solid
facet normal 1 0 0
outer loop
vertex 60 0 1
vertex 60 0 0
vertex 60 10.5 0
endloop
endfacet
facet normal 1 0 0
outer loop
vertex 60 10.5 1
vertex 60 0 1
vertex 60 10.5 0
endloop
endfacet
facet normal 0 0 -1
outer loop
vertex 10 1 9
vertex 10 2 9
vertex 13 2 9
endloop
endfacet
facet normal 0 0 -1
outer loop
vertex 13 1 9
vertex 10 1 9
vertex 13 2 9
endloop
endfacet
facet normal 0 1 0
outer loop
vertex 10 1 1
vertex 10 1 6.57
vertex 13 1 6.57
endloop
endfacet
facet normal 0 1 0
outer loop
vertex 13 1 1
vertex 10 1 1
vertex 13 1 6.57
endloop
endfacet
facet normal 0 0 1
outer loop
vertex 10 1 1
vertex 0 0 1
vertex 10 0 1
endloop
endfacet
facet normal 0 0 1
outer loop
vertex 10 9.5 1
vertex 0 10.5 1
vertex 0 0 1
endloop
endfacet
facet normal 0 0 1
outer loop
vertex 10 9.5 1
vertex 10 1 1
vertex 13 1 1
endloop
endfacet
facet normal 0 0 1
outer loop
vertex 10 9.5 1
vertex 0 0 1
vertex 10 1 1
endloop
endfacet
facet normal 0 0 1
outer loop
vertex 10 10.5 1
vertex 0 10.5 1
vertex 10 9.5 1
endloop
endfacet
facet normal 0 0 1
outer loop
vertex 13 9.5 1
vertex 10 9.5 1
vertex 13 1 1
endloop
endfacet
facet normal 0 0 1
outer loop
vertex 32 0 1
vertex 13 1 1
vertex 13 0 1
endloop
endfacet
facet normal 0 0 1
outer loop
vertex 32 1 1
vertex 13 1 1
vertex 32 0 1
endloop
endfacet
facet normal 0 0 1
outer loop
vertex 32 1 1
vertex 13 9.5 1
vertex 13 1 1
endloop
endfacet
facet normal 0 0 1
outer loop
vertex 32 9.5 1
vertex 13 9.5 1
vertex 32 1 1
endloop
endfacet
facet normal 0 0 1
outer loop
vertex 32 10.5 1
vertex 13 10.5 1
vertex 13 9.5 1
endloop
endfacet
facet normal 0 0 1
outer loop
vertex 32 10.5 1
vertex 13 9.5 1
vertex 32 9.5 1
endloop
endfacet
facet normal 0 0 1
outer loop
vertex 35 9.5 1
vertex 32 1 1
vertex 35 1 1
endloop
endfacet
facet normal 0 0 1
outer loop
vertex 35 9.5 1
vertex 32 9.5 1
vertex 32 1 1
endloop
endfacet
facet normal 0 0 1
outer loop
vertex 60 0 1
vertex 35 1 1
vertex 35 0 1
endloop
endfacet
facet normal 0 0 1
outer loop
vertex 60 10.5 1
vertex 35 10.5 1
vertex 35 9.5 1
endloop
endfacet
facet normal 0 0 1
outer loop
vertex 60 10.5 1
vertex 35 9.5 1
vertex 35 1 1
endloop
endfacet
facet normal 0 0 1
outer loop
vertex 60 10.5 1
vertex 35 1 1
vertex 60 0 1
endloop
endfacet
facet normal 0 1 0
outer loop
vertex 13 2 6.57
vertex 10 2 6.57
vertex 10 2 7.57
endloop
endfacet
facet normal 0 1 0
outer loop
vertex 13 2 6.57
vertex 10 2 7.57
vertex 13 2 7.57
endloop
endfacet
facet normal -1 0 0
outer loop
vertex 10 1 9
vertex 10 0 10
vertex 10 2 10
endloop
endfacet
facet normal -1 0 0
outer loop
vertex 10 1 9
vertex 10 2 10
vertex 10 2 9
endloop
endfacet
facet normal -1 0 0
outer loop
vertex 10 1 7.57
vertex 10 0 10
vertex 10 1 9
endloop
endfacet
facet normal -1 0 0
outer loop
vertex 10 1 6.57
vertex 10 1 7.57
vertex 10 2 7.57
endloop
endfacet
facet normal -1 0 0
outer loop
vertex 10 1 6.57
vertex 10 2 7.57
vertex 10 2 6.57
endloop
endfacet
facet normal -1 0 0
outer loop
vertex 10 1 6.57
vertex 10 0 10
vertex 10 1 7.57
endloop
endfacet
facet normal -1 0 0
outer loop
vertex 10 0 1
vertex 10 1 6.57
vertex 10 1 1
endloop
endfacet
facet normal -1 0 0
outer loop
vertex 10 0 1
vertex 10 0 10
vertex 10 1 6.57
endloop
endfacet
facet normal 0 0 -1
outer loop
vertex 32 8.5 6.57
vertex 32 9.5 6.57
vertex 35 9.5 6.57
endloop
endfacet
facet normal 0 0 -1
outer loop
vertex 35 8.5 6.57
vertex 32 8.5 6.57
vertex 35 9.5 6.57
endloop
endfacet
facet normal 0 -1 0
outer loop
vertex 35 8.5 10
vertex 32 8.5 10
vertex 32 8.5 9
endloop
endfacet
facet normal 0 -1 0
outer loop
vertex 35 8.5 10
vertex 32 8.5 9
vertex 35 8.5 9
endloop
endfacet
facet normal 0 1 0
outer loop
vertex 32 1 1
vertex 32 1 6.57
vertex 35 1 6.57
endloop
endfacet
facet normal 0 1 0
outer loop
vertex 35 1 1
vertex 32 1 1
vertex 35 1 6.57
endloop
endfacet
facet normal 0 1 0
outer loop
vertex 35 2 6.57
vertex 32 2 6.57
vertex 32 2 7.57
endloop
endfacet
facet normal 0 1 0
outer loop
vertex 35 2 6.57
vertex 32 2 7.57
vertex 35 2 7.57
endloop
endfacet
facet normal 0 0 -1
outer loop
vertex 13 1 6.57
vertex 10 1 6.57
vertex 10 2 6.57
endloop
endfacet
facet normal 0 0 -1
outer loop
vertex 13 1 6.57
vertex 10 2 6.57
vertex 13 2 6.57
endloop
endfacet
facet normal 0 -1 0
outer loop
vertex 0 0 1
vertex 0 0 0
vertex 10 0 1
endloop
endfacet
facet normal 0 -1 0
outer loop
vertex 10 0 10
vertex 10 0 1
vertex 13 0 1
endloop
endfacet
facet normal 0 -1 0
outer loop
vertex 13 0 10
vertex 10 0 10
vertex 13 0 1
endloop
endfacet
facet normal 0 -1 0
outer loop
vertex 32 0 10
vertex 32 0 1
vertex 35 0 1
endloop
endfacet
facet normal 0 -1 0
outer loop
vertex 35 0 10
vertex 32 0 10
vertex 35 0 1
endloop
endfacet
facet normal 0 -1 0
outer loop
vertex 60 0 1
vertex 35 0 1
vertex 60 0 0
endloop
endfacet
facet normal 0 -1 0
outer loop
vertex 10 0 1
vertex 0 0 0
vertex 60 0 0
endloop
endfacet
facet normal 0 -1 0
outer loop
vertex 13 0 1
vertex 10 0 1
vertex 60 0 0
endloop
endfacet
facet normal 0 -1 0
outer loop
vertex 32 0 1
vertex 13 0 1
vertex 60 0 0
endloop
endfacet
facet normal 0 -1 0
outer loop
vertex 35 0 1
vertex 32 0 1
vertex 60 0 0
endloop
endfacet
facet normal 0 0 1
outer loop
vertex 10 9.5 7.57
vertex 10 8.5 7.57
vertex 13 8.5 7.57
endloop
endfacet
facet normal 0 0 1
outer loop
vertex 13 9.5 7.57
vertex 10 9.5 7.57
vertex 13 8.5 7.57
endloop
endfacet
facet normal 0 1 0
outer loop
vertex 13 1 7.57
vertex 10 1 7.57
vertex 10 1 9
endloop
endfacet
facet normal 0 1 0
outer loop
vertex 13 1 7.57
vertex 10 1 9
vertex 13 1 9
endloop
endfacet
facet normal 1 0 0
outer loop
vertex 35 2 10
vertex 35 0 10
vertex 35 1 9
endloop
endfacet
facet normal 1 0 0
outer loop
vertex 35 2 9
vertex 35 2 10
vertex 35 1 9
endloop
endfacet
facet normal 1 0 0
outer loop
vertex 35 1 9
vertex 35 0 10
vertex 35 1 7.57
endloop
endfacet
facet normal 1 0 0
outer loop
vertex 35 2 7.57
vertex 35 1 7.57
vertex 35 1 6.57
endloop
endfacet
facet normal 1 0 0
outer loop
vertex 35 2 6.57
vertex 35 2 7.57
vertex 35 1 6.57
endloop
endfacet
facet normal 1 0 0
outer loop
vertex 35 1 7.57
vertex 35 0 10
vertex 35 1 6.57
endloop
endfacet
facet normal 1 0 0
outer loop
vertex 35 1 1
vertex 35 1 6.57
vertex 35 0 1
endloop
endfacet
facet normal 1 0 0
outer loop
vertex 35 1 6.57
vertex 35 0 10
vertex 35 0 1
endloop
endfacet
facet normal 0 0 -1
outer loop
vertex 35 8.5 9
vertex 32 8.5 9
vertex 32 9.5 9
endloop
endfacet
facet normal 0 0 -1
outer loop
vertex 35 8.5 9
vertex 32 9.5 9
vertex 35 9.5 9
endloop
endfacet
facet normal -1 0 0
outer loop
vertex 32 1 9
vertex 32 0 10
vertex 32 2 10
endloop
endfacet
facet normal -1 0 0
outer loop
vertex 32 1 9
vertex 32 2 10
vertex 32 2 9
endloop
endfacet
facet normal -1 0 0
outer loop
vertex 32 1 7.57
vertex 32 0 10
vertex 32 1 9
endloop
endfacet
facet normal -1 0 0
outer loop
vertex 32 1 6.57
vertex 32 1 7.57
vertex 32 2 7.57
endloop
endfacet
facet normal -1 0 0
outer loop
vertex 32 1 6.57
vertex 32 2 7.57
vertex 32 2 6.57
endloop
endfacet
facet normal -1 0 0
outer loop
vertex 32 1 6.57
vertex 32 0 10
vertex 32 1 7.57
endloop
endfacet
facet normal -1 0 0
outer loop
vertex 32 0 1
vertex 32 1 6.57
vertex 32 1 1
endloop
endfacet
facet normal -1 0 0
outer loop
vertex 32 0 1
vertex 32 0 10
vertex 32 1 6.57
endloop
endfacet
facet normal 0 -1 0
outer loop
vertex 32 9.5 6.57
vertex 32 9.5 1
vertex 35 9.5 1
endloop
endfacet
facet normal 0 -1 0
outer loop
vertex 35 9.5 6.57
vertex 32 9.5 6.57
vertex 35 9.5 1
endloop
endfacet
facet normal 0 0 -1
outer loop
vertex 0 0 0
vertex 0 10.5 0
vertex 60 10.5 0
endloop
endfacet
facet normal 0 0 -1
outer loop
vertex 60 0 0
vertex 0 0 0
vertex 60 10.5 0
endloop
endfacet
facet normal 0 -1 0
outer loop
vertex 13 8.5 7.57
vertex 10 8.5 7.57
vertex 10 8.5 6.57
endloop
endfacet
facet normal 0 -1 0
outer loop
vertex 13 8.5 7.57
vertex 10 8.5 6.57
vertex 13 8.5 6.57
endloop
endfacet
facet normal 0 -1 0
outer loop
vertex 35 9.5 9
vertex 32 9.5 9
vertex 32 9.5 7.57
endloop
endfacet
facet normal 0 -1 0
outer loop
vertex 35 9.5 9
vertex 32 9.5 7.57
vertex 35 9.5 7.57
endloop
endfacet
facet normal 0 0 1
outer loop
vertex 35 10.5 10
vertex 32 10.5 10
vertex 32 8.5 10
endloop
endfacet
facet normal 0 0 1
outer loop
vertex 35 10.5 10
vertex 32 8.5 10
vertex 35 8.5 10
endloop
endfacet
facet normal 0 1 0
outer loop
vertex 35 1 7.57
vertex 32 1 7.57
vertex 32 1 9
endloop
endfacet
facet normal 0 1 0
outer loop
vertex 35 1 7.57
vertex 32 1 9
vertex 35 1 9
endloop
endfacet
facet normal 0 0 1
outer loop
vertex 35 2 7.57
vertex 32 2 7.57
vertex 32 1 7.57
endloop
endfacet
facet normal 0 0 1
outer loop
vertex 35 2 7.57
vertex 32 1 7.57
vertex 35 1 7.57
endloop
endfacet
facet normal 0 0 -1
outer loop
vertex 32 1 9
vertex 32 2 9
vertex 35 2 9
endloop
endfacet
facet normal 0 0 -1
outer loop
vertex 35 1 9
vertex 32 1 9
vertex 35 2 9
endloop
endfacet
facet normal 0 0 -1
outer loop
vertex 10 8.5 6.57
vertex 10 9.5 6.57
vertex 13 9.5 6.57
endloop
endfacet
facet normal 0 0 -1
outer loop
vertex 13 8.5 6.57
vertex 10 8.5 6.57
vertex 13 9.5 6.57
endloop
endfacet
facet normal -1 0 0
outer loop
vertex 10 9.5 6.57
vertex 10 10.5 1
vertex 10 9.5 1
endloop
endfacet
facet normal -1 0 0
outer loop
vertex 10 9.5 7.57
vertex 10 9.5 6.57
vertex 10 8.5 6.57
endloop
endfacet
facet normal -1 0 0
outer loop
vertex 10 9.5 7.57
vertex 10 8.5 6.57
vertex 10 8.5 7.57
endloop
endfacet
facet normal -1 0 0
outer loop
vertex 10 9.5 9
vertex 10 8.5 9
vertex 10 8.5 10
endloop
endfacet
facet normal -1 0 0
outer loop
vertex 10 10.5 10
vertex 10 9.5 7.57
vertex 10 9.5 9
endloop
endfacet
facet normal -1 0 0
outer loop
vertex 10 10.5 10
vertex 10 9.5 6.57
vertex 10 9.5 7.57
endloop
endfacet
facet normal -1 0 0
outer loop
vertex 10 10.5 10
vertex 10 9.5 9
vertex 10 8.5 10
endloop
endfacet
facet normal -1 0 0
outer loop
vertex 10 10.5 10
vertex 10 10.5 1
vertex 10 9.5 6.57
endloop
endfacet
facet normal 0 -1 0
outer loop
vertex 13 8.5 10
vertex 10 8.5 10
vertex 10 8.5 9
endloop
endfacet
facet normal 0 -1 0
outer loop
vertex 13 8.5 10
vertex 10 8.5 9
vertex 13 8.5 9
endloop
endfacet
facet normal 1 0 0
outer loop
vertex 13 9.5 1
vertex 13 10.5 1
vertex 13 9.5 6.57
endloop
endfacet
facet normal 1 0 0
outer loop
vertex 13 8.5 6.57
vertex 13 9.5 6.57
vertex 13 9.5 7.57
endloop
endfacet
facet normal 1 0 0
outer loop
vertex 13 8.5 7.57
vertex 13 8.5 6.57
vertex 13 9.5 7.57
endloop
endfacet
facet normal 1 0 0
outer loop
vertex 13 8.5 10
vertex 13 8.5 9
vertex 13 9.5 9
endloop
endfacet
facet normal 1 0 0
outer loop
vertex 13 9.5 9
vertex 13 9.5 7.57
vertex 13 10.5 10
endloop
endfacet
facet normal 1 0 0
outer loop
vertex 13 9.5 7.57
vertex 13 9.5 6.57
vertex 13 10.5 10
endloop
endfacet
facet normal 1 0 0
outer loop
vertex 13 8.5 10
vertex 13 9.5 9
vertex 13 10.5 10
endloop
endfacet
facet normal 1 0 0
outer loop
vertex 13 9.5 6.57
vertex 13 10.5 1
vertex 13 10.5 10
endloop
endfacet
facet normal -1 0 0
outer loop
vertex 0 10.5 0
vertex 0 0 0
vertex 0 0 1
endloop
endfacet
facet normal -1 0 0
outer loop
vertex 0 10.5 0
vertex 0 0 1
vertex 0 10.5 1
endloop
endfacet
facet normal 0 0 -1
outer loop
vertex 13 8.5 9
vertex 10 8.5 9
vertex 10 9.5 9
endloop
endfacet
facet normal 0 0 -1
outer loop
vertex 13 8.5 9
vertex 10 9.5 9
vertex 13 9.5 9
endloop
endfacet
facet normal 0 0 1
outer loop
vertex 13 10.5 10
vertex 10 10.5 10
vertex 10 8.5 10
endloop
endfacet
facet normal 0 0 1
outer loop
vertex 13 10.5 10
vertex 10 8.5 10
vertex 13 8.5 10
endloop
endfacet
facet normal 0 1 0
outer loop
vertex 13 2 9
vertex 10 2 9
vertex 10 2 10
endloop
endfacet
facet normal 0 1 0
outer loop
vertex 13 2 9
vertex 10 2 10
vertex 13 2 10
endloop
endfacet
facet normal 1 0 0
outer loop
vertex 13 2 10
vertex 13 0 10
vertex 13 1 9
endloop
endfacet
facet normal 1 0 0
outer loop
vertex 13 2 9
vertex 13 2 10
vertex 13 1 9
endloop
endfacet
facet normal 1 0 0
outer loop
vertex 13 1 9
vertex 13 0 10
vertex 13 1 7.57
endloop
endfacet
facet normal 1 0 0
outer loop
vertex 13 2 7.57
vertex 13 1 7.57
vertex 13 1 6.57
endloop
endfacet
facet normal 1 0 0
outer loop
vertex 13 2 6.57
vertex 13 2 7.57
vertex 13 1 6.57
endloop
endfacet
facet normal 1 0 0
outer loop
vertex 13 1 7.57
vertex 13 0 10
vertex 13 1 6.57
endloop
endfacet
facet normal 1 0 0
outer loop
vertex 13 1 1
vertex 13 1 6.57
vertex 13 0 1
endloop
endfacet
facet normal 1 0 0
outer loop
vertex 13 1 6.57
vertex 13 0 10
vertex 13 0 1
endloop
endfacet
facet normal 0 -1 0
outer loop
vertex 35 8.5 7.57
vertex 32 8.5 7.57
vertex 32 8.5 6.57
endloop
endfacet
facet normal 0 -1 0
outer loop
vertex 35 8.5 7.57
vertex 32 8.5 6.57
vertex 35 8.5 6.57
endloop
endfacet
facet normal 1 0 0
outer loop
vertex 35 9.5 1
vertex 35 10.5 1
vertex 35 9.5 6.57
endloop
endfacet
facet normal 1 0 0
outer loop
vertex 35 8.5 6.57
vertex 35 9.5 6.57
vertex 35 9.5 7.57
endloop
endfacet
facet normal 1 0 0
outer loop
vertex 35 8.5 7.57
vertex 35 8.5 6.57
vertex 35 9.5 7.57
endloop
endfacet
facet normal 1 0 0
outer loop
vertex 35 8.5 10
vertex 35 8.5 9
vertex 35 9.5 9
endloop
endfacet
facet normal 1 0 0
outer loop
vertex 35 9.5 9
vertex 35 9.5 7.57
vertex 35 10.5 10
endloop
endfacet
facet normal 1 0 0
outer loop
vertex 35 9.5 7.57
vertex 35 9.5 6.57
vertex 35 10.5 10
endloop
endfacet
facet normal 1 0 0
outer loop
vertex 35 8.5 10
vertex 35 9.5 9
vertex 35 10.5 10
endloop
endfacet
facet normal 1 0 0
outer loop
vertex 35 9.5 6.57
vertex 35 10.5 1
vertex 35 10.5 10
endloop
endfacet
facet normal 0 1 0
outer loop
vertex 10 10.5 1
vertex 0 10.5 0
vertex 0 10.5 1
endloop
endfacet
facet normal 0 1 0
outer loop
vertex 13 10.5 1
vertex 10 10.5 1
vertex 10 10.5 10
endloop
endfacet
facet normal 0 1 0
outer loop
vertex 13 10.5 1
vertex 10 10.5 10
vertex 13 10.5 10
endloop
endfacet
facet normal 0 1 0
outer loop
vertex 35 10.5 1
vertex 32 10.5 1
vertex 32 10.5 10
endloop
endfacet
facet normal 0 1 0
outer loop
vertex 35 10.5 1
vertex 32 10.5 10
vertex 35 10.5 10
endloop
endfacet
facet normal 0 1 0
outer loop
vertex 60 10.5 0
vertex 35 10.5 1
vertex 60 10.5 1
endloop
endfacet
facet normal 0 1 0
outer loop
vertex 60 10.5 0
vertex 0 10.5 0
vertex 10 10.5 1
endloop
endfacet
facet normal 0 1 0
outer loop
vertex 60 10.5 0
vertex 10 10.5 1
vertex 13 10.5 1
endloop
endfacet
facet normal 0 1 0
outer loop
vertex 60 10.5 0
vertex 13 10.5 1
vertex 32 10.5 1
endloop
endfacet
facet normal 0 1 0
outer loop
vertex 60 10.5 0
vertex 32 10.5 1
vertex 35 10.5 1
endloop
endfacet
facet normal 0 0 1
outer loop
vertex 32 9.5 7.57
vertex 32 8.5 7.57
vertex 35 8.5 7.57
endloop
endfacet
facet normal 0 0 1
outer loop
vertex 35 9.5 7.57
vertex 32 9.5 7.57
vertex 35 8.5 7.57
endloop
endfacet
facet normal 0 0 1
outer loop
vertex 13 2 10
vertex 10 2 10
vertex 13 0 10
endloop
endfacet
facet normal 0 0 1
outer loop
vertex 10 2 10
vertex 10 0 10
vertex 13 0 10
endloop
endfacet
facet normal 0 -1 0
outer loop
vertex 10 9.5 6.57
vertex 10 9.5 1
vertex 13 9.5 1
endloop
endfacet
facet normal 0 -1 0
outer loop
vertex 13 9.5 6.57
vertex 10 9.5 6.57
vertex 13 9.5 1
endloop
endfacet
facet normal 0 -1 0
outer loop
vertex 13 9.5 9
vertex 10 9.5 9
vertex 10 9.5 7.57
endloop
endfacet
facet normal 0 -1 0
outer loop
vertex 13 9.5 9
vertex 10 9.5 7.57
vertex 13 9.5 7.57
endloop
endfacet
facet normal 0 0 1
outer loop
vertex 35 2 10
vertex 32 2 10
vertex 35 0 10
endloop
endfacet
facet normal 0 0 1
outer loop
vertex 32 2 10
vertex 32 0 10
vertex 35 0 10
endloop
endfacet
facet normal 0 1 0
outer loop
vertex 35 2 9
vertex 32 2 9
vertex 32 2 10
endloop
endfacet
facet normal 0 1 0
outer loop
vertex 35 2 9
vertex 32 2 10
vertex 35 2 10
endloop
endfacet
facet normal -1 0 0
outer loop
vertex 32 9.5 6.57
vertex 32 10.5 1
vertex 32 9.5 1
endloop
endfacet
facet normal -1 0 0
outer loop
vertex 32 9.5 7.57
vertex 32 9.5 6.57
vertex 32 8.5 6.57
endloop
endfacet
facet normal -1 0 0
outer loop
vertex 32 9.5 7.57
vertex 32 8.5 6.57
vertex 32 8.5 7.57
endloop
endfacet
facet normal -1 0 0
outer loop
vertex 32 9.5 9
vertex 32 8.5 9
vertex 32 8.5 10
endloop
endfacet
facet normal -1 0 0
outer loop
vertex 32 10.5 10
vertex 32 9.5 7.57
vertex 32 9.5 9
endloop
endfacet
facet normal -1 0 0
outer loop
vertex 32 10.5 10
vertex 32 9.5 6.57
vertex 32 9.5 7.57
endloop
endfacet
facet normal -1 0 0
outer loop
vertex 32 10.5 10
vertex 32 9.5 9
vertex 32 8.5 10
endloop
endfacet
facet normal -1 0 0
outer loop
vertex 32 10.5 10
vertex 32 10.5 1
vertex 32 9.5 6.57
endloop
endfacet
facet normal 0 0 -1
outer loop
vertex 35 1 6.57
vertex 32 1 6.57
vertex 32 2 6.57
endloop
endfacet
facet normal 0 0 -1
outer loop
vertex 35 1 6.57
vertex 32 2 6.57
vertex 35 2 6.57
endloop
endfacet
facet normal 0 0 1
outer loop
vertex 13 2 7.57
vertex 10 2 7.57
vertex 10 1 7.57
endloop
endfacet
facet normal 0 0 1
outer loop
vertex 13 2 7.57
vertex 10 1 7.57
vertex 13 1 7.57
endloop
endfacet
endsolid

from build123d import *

# Parameters (mm, degrees)
SKETCH1_W           = 60
SKETCH1_H           = 10.5
BOSS_EXTRUDE1_DEPTH = 1
SKETCH2_W           = 3
SKETCH2_H           = 10
BOSS_EXTRUDE2_DEPTH = 1
SKETCH3_W           = 3
SKETCH3_H           = 3.43
BOSS_EXTRUDE3_DEPTH = 1
SKETCH4_W           = 3
SKETCH4_H           = 1.43
CUT_EXTRUDE1_DEPTH  = 1
SKETCH6_W           = 3
SKETCH6_H           = 10
BOSS_EXTRUDE4_DEPTH = 1
SKETCH7_W           = 3
SKETCH7_H           = 3.43
BOSS_EXTRUDE5_DEPTH = 1
SKETCH8_W           = 3
SKETCH8_H           = 1.43
CUT_EXTRUDE2_DEPTH  = 1
SKETCH9_W           = 3
SKETCH9_H           = 10
BOSS_EXTRUDE6_DEPTH = 1
SKETCH10_W          = 3
SKETCH10_H          = 3.43
BOSS_EXTRUDE7_DEPTH = 1
SKETCH11_W          = 3
SKETCH11_H          = 1.43
CUT_EXTRUDE3_DEPTH  = 1
SKETCH12_W          = 3
SKETCH12_H          = 10
BOSS_EXTRUDE8_DEPTH = 1
SKETCH13_W          = 3
SKETCH13_H          = 3.43
BOSS_EXTRUDE9_DEPTH = 1
SKETCH14_W          = 3
SKETCH14_H          = 1.43
CUT_EXTRUDE4_DEPTH  = 1


with BuildPart() as part:
    # Sketch1 → Boss-Extrude1 (new body)
    with BuildSketch(Plane.XY):
        with Locations((30, 5.25)):
            Rectangle(SKETCH1_W, SKETCH1_H)
    extrude(amount=BOSS_EXTRUDE1_DEPTH)

    # Sketch2 → Boss-Extrude2 (add)
    with BuildSketch(Plane.XZ):
        with Locations((11.5, 5)):
            Rectangle(SKETCH2_W, SKETCH2_H)
    extrude(amount=-BOSS_EXTRUDE2_DEPTH)

    # Sketch3 → Boss-Extrude3 (add)
    with BuildSketch(Plane(origin=(0, 1, 0), x_dir=(1, 0, 0), z_dir=(0, 1, 0))):
        with Locations((11.5, -8.285)):
            Rectangle(SKETCH3_W, SKETCH3_H)
    extrude(amount=BOSS_EXTRUDE3_DEPTH)

    # Sketch4 → Cut-Extrude1 (cut)
    with BuildSketch(Plane(origin=(0, 2, 0), x_dir=(1, 0, 0), z_dir=(0, 1, 0))):
        with Locations((11.5, -8.285)):
            Rectangle(SKETCH4_W, SKETCH4_H)
    extrude(amount=-CUT_EXTRUDE1_DEPTH, mode=Mode.SUBTRACT)

    # Sketch6 → Boss-Extrude4 (add)
    with BuildSketch(Plane(origin=(0, 10.5, 0), x_dir=(1, 0, 0), z_dir=(0, 1, 0))):
        with Locations((11.5, -5)):
            Rectangle(SKETCH6_W, SKETCH6_H)
    extrude(amount=-BOSS_EXTRUDE4_DEPTH)

    # Sketch7 → Boss-Extrude5 (add)
    with BuildSketch(Plane.XZ.offset(-9.5)):
        with Locations((11.5, 8.285)):
            Rectangle(SKETCH7_W, SKETCH7_H)
    extrude(amount=BOSS_EXTRUDE5_DEPTH)

    # Sketch8 → Cut-Extrude2 (cut)
    with BuildSketch(Plane.XZ.offset(-8.5)):
        with Locations((11.5, 8.285)):
            Rectangle(SKETCH8_W, SKETCH8_H)
    extrude(amount=-CUT_EXTRUDE2_DEPTH, mode=Mode.SUBTRACT)

    # Sketch9 → Boss-Extrude6 (add)
    with BuildSketch(Plane.XZ):
        with Locations((33.5, 5)):
            Rectangle(SKETCH9_W, SKETCH9_H)
    extrude(amount=-BOSS_EXTRUDE6_DEPTH)

    # Sketch10 → Boss-Extrude7 (add)
    with BuildSketch(Plane(origin=(0, 1, 0), x_dir=(1, 0, 0), z_dir=(0, 1, 0))):
        with Locations((33.5, -8.285)):
            Rectangle(SKETCH10_W, SKETCH10_H)
    extrude(amount=BOSS_EXTRUDE7_DEPTH)

    # Sketch11 → Cut-Extrude3 (cut)
    with BuildSketch(Plane(origin=(0, 2, 0), x_dir=(1, 0, 0), z_dir=(0, 1, 0))):
        with Locations((33.5, -8.285)):
            Rectangle(SKETCH11_W, SKETCH11_H)
    extrude(amount=-CUT_EXTRUDE3_DEPTH, mode=Mode.SUBTRACT)

    # Sketch12 → Boss-Extrude8 (add)
    with BuildSketch(Plane(origin=(0, 10.5, 0), x_dir=(1, 0, 0), z_dir=(0, 1, 0))):
        with Locations((33.5, -5)):
            Rectangle(SKETCH12_W, SKETCH12_H)
    extrude(amount=-BOSS_EXTRUDE8_DEPTH)

    # Sketch13 → Boss-Extrude9 (add)
    with BuildSketch(Plane.XZ.offset(-9.5)):
        with Locations((33.5, 8.285)):
            Rectangle(SKETCH13_W, SKETCH13_H)
    extrude(amount=BOSS_EXTRUDE9_DEPTH)

    # Sketch14 → Cut-Extrude4 (cut)
    with BuildSketch(Plane.XZ.offset(-8.5)):
        with Locations((33.5, 8.285)):
            Rectangle(SKETCH14_W, SKETCH14_H)
    extrude(amount=-CUT_EXTRUDE4_DEPTH, mode=Mode.SUBTRACT)


solid = part.part
